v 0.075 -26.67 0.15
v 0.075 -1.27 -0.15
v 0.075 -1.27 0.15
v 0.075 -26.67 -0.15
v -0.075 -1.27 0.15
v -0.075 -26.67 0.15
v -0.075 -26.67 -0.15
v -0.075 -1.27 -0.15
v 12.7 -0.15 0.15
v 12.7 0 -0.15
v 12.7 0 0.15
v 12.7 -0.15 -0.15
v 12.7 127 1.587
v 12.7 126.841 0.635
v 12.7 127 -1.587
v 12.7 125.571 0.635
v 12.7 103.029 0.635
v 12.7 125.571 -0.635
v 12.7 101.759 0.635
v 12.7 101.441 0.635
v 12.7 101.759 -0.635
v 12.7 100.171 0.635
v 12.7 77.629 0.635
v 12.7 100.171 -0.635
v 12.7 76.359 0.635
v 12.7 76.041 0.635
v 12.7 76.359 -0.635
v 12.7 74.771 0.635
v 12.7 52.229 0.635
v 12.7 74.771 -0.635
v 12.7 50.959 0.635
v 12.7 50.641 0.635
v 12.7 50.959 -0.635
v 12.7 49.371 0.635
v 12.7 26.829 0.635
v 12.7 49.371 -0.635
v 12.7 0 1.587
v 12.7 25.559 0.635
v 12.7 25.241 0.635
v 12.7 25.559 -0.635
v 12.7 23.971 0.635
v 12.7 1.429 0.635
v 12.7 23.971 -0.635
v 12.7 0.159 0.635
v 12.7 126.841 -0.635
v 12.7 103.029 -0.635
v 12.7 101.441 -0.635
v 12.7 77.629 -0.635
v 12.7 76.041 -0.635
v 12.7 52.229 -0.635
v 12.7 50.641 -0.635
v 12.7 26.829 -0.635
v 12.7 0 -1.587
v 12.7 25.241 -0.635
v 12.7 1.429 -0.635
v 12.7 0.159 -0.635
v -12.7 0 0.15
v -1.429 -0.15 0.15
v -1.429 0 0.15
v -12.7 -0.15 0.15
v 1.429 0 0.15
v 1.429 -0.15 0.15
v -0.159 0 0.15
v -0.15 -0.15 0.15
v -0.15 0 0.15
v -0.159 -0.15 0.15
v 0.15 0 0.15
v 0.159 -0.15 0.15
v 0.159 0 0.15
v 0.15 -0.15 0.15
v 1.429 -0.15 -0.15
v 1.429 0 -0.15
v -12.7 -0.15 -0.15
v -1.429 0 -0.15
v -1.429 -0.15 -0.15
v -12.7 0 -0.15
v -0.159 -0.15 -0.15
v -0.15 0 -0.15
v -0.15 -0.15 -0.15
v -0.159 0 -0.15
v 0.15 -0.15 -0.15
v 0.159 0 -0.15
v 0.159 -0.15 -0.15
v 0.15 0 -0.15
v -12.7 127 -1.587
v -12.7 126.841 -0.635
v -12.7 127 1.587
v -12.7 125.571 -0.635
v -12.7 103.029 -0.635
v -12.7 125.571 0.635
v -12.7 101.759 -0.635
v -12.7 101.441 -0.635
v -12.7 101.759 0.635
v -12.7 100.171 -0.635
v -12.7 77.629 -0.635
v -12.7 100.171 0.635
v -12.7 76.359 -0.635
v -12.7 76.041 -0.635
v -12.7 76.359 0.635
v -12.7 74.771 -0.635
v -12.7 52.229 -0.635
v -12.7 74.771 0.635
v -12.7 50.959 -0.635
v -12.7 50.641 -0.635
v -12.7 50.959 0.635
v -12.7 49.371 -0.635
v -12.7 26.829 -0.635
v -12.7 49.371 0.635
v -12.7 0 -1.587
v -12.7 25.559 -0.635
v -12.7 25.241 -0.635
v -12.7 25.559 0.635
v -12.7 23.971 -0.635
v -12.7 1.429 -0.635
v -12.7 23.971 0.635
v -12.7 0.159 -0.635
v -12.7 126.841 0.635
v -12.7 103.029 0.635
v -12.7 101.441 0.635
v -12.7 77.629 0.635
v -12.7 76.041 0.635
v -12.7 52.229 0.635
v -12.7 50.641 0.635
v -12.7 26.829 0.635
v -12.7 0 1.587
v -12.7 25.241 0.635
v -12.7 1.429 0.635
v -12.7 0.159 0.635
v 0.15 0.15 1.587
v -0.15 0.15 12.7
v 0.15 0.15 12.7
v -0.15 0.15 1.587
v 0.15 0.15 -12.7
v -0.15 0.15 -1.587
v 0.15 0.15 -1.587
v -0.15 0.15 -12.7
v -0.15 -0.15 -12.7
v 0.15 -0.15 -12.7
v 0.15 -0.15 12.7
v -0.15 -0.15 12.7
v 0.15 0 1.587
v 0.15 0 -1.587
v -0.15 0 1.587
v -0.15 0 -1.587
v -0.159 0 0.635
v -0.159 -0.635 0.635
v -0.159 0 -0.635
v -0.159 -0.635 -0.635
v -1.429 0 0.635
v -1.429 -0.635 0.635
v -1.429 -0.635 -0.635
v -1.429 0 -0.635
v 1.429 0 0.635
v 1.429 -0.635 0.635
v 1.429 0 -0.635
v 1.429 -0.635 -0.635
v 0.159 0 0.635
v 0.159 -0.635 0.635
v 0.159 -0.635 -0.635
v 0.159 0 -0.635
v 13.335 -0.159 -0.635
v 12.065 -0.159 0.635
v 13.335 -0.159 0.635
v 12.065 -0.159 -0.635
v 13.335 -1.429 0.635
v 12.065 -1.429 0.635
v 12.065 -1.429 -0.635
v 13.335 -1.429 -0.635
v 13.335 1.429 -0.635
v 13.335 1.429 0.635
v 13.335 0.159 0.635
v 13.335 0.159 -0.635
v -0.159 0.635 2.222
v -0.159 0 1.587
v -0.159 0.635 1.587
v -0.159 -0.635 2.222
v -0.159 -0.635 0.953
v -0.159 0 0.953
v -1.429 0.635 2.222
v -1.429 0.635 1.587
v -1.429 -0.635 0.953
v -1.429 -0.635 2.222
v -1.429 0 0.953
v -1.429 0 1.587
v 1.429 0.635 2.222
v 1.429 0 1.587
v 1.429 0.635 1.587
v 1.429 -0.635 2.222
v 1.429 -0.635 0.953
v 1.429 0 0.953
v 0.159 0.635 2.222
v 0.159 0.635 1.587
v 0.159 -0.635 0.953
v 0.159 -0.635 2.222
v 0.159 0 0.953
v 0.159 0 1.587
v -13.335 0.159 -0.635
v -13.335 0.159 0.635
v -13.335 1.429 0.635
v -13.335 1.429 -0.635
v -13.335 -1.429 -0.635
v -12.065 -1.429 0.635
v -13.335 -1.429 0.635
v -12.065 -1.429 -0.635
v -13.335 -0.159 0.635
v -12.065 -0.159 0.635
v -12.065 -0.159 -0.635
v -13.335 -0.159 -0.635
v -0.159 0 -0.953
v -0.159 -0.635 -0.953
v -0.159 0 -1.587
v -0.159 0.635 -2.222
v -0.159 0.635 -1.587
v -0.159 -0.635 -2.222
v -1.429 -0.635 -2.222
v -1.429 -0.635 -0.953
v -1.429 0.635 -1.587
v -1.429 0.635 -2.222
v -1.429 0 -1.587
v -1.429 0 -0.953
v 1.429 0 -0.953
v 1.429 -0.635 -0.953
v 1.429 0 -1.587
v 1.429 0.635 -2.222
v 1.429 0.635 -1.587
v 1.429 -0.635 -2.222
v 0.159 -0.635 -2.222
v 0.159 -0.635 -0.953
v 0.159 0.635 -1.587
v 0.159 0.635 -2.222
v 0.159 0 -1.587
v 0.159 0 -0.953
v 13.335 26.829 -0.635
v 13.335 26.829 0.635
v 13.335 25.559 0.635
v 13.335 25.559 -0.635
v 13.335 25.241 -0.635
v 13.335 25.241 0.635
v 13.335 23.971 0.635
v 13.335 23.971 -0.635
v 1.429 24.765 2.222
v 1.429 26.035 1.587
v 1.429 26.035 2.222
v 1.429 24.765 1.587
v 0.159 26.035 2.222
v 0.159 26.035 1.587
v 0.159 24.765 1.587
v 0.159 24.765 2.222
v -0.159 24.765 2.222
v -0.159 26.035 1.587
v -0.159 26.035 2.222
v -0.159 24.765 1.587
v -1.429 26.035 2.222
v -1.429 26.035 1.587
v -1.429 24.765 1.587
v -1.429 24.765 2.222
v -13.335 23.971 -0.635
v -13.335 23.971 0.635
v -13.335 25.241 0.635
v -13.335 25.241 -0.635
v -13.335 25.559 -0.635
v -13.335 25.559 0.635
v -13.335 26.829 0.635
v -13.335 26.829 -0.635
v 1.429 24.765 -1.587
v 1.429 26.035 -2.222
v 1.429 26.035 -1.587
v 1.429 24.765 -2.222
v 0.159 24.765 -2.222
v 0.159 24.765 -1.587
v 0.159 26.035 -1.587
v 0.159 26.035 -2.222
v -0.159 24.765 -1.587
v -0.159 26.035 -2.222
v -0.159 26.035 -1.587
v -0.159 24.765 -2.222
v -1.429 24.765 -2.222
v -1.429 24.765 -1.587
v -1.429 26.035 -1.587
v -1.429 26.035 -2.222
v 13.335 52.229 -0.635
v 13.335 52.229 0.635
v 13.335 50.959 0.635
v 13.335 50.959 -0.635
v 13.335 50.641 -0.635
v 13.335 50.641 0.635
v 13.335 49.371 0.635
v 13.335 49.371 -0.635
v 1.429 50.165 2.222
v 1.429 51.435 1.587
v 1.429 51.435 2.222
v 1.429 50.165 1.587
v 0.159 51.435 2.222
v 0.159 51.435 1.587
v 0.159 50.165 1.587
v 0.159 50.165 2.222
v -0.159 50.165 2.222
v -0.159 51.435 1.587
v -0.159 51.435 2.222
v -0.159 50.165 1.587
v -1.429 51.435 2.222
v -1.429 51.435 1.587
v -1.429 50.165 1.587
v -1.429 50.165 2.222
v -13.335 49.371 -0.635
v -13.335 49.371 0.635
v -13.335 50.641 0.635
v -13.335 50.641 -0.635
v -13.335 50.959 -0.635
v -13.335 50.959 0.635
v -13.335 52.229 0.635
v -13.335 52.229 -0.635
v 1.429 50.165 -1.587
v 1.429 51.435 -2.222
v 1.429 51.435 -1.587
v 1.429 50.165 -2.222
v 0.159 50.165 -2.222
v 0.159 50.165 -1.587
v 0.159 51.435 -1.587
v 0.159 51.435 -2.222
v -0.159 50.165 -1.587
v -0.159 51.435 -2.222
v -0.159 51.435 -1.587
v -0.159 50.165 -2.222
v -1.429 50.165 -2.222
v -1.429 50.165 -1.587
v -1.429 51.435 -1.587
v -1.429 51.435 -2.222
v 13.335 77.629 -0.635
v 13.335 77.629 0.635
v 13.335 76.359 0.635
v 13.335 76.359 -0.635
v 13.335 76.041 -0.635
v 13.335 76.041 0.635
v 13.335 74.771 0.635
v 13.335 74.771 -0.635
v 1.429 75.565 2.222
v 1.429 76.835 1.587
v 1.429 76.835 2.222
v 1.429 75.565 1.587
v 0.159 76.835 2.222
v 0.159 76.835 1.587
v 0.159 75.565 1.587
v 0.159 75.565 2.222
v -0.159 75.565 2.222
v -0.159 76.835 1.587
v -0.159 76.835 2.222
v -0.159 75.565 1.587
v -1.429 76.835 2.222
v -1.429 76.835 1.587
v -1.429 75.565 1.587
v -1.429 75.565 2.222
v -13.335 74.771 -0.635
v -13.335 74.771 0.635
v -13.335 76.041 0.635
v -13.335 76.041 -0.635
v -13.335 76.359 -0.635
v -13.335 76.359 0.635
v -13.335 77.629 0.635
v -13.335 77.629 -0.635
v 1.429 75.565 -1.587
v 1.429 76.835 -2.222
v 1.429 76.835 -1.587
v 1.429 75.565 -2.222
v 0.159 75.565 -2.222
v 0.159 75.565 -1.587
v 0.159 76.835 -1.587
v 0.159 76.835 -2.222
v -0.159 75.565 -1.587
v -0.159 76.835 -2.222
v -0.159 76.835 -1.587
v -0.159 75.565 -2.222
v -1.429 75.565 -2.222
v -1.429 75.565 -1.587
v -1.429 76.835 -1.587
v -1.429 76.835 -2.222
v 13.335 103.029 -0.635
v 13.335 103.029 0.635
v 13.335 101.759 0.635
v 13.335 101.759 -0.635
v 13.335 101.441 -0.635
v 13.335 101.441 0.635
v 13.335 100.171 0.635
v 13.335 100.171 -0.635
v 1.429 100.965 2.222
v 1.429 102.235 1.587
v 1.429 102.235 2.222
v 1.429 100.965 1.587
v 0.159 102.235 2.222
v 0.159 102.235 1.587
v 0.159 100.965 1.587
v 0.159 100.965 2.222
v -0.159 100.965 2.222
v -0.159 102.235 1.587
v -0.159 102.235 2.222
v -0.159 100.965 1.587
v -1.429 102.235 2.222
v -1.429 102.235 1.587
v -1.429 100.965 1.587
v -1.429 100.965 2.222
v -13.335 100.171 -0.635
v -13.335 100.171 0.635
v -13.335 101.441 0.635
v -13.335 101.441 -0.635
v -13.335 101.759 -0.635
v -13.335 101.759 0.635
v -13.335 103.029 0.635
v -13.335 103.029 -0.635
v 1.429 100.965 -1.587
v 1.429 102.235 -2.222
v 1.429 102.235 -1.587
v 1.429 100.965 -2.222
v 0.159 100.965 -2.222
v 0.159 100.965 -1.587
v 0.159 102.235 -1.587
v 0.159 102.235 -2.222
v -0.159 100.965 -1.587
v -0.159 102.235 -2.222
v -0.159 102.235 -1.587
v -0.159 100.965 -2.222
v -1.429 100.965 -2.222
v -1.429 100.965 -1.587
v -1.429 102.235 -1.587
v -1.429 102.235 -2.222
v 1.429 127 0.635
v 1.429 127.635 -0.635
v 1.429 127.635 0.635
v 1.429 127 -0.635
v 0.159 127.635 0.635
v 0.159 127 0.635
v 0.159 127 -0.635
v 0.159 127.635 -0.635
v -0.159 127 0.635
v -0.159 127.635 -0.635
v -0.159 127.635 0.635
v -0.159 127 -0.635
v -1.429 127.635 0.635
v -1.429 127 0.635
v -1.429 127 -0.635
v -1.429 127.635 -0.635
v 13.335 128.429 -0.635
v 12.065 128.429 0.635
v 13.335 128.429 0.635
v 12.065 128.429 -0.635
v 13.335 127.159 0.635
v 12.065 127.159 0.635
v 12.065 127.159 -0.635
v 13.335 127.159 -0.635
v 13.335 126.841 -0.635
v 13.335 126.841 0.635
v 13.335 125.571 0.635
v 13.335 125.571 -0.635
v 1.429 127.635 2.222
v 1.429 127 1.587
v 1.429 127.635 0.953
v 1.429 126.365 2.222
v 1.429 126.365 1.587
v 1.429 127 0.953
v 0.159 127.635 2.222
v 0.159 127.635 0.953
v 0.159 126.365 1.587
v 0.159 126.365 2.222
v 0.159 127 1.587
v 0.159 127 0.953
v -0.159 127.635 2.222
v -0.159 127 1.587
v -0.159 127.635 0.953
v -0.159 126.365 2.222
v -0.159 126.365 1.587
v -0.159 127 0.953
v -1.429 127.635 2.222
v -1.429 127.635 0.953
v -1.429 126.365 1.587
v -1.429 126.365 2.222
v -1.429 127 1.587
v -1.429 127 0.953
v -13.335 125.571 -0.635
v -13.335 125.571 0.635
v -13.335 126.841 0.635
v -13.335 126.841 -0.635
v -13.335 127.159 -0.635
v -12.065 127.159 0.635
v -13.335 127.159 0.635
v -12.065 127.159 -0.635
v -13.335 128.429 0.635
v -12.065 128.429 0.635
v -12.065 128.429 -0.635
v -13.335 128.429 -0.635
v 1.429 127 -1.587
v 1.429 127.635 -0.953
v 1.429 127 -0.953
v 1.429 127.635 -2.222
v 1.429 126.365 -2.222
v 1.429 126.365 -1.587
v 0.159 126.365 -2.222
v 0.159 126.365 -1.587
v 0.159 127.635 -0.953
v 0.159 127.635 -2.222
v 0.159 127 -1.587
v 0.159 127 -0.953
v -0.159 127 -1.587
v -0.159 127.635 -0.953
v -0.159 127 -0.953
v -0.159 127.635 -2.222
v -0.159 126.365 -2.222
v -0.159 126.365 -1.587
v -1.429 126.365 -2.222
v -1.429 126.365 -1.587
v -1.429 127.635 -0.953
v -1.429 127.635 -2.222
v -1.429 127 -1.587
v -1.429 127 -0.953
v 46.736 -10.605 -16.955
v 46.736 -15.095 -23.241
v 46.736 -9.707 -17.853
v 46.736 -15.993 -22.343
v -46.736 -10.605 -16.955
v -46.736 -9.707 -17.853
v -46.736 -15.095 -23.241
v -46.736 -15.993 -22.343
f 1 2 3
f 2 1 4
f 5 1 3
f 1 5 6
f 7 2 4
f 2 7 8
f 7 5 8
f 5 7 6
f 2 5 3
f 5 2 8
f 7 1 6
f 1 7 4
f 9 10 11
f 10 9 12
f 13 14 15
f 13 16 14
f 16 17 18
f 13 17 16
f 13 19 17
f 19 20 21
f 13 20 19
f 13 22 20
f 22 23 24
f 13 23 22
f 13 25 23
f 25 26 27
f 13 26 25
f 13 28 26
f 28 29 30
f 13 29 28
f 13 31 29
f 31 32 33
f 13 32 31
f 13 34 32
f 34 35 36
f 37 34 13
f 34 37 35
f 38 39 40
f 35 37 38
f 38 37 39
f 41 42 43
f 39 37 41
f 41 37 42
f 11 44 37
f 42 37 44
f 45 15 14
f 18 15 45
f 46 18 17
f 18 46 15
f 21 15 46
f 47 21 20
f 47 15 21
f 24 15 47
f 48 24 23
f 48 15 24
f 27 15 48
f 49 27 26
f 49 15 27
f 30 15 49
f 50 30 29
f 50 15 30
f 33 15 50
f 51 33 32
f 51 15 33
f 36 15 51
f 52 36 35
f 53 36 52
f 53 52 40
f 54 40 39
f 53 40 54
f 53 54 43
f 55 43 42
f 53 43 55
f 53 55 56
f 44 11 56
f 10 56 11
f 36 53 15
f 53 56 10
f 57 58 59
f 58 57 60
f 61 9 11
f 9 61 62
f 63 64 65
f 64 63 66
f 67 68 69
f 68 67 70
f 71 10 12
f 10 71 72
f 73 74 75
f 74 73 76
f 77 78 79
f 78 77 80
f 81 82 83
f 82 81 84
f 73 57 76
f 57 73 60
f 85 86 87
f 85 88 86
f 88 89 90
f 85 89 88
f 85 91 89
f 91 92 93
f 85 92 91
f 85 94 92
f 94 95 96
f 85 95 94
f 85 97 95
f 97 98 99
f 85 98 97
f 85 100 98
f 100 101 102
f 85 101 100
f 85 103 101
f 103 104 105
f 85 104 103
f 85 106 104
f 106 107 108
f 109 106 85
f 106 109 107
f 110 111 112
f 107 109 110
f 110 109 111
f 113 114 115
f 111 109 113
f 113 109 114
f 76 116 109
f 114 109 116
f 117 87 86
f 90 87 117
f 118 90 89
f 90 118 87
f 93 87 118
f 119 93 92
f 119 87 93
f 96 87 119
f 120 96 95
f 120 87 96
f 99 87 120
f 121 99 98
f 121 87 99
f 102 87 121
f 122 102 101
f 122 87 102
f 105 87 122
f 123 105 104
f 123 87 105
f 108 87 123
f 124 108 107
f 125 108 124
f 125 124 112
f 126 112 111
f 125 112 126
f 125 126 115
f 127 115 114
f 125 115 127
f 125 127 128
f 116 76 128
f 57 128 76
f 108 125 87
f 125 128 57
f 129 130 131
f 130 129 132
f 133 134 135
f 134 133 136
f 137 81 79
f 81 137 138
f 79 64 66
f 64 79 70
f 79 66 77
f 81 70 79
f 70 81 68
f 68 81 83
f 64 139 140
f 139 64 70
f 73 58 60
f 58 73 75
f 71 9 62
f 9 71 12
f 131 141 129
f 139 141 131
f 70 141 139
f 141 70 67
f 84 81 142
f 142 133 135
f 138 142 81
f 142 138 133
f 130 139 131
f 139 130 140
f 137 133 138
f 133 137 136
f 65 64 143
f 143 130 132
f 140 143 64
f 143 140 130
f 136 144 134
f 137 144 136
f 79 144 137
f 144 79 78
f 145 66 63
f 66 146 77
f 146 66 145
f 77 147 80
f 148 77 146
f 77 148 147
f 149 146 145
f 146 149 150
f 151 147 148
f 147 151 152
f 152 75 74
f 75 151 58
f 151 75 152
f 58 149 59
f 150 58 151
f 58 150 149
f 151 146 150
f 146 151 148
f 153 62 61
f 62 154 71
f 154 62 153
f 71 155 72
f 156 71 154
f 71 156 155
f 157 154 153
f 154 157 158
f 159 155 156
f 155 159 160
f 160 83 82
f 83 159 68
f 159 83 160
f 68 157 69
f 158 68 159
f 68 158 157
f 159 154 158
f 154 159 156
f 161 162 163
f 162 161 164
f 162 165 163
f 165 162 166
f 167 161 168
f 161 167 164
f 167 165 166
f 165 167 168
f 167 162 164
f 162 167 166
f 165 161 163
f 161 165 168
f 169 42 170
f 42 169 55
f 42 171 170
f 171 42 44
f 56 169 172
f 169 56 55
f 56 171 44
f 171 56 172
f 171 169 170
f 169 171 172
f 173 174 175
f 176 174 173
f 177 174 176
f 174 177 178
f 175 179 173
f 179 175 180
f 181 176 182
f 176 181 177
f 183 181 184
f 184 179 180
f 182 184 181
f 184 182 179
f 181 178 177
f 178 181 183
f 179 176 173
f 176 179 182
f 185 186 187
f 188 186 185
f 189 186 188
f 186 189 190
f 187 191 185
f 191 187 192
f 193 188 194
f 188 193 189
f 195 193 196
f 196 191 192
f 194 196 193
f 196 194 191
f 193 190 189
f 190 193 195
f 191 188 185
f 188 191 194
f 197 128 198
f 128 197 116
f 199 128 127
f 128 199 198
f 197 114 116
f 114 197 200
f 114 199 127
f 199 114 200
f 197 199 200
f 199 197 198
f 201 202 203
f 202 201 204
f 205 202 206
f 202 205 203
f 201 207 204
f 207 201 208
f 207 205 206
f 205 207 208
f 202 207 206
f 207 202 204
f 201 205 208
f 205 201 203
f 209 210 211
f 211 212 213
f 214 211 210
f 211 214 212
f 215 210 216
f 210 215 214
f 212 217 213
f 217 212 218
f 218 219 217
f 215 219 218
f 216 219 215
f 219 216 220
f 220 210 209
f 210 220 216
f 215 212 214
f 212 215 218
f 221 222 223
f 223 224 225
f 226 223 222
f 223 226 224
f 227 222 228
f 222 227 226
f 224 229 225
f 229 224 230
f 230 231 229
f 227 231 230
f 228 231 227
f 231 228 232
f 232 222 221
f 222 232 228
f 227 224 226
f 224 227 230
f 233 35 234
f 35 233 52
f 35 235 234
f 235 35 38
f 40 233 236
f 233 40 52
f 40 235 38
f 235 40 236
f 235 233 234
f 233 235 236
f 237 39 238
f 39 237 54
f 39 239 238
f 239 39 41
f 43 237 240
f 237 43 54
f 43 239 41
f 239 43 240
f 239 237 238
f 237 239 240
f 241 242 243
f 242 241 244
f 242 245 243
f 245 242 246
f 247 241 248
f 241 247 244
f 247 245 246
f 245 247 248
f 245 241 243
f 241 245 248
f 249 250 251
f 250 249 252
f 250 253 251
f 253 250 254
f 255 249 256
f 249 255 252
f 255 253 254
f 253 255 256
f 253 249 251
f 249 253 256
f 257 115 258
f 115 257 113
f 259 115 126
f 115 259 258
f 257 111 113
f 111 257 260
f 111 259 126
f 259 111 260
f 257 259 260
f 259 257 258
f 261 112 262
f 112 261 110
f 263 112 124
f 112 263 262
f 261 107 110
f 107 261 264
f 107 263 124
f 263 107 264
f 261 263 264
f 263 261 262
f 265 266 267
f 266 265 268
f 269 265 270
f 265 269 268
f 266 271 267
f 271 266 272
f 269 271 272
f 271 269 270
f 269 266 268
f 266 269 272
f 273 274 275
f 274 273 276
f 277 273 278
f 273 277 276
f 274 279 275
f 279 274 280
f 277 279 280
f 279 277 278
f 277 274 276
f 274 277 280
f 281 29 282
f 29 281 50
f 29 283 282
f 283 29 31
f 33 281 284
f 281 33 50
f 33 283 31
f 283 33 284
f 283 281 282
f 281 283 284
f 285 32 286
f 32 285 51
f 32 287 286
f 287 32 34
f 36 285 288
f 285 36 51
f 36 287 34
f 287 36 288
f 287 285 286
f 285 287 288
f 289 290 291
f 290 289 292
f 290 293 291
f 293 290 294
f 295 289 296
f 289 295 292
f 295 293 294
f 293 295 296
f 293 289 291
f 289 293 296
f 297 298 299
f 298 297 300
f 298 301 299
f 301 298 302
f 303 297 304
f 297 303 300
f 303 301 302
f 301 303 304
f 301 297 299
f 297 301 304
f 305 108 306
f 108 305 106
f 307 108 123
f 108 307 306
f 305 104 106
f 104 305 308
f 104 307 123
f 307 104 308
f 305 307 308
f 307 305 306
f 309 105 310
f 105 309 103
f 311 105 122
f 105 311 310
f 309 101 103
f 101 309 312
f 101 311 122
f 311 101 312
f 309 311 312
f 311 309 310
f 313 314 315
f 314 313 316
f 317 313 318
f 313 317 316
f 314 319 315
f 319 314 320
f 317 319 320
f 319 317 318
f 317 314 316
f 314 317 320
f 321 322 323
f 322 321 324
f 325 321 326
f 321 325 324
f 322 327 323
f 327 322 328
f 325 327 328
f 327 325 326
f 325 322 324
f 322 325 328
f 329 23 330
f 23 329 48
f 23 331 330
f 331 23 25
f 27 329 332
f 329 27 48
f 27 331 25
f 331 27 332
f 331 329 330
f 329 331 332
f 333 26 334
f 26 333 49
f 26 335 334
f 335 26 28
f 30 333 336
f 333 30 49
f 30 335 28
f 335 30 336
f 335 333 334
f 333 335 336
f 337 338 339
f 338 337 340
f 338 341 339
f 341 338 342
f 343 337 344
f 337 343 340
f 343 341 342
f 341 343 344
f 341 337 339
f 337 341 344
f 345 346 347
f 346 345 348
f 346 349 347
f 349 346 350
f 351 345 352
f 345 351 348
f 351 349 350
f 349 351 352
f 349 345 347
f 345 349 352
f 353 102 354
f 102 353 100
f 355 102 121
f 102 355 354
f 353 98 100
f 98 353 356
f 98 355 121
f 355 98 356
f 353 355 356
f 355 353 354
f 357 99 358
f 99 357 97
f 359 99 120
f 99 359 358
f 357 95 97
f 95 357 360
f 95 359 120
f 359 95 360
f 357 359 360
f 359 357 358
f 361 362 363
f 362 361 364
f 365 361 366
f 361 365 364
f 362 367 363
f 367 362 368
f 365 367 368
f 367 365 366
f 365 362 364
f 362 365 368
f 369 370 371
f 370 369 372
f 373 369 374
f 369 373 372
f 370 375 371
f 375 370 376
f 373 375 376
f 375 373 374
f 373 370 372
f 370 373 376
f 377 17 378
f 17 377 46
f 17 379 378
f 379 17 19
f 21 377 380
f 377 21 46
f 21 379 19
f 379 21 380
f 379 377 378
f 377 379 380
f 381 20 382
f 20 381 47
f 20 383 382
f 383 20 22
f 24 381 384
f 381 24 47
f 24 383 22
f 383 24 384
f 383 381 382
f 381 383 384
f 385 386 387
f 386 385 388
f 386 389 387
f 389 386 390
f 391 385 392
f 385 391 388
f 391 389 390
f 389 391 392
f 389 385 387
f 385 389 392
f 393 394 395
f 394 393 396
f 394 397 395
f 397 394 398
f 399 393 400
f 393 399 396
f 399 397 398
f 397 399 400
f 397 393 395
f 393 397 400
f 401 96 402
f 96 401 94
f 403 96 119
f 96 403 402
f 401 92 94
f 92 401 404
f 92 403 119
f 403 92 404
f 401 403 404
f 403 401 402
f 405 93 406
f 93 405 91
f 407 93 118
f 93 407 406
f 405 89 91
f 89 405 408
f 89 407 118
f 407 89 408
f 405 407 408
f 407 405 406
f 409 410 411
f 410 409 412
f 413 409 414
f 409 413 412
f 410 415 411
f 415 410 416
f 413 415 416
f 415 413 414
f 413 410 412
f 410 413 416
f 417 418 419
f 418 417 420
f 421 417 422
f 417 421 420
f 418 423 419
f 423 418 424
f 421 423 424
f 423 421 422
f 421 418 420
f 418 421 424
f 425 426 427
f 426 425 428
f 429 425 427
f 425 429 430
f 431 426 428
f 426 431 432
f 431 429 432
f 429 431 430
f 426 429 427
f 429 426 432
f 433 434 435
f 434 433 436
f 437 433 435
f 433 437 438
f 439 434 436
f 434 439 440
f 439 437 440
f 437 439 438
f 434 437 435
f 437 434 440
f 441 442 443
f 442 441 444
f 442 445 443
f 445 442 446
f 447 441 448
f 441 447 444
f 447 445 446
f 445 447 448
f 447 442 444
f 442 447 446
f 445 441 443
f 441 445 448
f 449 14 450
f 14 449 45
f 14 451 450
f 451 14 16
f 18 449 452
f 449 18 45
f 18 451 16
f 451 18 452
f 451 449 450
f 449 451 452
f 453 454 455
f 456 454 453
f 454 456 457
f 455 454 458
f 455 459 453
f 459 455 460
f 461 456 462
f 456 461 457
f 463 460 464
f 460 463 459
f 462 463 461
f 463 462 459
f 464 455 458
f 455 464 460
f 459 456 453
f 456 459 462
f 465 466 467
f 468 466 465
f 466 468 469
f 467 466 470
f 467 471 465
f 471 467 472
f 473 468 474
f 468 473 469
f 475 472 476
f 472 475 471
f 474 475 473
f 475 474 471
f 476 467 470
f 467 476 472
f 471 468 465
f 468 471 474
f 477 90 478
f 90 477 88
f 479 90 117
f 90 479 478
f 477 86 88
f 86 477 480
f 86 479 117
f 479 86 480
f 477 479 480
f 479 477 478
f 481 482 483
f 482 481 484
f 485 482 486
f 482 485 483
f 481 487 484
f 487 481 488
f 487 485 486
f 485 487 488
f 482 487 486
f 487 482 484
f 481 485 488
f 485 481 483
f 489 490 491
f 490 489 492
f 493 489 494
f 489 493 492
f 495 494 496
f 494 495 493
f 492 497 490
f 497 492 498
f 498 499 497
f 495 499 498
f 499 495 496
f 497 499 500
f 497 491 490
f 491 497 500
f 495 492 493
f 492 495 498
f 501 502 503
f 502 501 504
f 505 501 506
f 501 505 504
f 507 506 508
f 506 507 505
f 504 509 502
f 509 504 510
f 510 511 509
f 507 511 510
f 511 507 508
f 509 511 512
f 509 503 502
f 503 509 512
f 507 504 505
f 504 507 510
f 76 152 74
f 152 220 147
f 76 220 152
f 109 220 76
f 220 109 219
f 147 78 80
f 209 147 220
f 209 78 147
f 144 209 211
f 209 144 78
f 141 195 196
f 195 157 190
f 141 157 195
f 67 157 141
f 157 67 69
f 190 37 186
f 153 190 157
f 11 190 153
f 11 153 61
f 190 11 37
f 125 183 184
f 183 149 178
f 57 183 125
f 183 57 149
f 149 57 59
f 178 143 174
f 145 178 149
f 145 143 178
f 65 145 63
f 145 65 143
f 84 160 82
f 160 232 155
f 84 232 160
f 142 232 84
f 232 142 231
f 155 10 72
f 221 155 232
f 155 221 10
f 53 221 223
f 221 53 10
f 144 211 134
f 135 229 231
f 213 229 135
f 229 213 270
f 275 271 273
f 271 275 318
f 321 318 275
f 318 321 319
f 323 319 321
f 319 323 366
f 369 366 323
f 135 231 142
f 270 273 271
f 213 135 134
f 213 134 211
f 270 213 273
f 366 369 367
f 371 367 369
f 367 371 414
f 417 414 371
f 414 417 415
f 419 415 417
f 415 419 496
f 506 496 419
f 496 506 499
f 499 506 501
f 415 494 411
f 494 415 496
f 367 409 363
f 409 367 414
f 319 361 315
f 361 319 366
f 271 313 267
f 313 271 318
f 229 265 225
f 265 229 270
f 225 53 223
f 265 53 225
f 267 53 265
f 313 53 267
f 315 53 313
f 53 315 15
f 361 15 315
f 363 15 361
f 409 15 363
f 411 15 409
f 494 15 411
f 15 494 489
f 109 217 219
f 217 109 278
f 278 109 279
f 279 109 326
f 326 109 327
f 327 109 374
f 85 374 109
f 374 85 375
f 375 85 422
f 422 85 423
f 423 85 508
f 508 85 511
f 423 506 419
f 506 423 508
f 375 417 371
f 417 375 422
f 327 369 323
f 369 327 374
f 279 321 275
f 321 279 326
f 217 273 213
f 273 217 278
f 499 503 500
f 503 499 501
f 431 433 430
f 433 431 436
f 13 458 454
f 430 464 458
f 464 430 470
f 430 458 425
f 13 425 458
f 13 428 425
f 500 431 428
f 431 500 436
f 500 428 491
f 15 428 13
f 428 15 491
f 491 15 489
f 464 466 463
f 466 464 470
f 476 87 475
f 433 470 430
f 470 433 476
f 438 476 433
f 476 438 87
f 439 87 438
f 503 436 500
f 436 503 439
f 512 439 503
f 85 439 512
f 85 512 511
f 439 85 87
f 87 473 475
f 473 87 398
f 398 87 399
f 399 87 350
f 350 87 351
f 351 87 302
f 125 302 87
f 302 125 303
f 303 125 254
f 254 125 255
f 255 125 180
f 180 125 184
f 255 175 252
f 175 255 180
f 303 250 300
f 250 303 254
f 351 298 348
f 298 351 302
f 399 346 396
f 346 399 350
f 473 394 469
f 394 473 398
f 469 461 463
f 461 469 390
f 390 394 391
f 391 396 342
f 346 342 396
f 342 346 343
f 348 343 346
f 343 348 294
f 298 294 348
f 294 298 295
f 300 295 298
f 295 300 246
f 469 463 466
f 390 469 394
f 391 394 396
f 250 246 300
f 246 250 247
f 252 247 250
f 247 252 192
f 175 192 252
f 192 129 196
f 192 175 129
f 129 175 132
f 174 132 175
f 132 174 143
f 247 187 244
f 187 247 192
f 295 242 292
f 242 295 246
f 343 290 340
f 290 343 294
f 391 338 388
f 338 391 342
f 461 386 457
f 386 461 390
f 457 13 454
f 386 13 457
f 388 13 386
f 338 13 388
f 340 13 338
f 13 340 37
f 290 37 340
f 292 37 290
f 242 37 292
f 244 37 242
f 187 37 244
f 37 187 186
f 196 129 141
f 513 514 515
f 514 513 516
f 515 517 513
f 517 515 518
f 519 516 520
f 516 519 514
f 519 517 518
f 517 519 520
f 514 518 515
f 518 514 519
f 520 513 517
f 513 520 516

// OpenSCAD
include <../mo/mo.scad>

SectionPositionCount = 5;

// Spec[ 0 ] = length
// Spec[ 1 ] = W
// Spec[ 2 ] = H
// Spec[ 3 ] = position spacing

// Pos[ 0 ] = section
// Pos[ 1 ] = position index

module moRectangularExtrusion( spec, p = [ 0, 0], info = false ) {
  color( Aluminum ) {
    moPitch( 3 ) {
      linear_extrude( height = spec[ 0 ] ) {
        square( [ spec[ 1 ], spec[ 2 ] ], center = true );
      }
    }
  }
  
  if ( info ) {
    moPartOrigin();
    for ( i = [ 0 : spec[ 0 ] / spec[ 3 ] ] )
      for ( j = [ 0 : SectionPositionCount - 1 ] ) {
        pi = [ i, j ];
        moMoveTo( moRectangularExtrusionPosition( pi, spec ) )
          moPosition2( pi );
      }
  }

  if ( $name )
    moPartLabel( parent_module( 1 ) );

}

function moRectangularExtrusionPositionSection( s, w, h ) = ( s == 0 ) ? [ [ 0, 0, 0 ], [ 0, 0, 1 ], 0 ] :
                                                            ( s == 1 ) ? [ [ w/2, 0, 0 ], [ 0, 0, 1 ], 90 ] :
                                                            ( s == 2 ) ? [ [ 0, 0, h/2 ], [ 1, 0, 0 ], -90 ] :
                                                            ( s == 3 ) ? [ [ -w/2, 0, 0 ], [ 0, 0, 1 ], -90 ] :
                                                                         [ [ 0, 0, -h/2 ], [ 1, 0, 0 ], 90 ];


function moRectangularExtrusionPosition( p = [0, 0 ], spec ) = moMoveToPosition( [ [ 0, p[0]*spec[3], 0 ], [ 1, 0, 0 ], 0 ], moRectangularExtrusionPositionSection( p[ 1 ], spec[ 1 ], spec[ 2 ] ) ); 

demoSpec = [ 5 * in, 1 * in, 0.125 * in, 1 * in ];

moMoveOriginTo( moRectangularExtrusionPosition( [ 0, 0 ], demoSpec ) )
  moRectangularExtrusion( demoSpec, [ 0, 0 ], info = true, $name=true );
